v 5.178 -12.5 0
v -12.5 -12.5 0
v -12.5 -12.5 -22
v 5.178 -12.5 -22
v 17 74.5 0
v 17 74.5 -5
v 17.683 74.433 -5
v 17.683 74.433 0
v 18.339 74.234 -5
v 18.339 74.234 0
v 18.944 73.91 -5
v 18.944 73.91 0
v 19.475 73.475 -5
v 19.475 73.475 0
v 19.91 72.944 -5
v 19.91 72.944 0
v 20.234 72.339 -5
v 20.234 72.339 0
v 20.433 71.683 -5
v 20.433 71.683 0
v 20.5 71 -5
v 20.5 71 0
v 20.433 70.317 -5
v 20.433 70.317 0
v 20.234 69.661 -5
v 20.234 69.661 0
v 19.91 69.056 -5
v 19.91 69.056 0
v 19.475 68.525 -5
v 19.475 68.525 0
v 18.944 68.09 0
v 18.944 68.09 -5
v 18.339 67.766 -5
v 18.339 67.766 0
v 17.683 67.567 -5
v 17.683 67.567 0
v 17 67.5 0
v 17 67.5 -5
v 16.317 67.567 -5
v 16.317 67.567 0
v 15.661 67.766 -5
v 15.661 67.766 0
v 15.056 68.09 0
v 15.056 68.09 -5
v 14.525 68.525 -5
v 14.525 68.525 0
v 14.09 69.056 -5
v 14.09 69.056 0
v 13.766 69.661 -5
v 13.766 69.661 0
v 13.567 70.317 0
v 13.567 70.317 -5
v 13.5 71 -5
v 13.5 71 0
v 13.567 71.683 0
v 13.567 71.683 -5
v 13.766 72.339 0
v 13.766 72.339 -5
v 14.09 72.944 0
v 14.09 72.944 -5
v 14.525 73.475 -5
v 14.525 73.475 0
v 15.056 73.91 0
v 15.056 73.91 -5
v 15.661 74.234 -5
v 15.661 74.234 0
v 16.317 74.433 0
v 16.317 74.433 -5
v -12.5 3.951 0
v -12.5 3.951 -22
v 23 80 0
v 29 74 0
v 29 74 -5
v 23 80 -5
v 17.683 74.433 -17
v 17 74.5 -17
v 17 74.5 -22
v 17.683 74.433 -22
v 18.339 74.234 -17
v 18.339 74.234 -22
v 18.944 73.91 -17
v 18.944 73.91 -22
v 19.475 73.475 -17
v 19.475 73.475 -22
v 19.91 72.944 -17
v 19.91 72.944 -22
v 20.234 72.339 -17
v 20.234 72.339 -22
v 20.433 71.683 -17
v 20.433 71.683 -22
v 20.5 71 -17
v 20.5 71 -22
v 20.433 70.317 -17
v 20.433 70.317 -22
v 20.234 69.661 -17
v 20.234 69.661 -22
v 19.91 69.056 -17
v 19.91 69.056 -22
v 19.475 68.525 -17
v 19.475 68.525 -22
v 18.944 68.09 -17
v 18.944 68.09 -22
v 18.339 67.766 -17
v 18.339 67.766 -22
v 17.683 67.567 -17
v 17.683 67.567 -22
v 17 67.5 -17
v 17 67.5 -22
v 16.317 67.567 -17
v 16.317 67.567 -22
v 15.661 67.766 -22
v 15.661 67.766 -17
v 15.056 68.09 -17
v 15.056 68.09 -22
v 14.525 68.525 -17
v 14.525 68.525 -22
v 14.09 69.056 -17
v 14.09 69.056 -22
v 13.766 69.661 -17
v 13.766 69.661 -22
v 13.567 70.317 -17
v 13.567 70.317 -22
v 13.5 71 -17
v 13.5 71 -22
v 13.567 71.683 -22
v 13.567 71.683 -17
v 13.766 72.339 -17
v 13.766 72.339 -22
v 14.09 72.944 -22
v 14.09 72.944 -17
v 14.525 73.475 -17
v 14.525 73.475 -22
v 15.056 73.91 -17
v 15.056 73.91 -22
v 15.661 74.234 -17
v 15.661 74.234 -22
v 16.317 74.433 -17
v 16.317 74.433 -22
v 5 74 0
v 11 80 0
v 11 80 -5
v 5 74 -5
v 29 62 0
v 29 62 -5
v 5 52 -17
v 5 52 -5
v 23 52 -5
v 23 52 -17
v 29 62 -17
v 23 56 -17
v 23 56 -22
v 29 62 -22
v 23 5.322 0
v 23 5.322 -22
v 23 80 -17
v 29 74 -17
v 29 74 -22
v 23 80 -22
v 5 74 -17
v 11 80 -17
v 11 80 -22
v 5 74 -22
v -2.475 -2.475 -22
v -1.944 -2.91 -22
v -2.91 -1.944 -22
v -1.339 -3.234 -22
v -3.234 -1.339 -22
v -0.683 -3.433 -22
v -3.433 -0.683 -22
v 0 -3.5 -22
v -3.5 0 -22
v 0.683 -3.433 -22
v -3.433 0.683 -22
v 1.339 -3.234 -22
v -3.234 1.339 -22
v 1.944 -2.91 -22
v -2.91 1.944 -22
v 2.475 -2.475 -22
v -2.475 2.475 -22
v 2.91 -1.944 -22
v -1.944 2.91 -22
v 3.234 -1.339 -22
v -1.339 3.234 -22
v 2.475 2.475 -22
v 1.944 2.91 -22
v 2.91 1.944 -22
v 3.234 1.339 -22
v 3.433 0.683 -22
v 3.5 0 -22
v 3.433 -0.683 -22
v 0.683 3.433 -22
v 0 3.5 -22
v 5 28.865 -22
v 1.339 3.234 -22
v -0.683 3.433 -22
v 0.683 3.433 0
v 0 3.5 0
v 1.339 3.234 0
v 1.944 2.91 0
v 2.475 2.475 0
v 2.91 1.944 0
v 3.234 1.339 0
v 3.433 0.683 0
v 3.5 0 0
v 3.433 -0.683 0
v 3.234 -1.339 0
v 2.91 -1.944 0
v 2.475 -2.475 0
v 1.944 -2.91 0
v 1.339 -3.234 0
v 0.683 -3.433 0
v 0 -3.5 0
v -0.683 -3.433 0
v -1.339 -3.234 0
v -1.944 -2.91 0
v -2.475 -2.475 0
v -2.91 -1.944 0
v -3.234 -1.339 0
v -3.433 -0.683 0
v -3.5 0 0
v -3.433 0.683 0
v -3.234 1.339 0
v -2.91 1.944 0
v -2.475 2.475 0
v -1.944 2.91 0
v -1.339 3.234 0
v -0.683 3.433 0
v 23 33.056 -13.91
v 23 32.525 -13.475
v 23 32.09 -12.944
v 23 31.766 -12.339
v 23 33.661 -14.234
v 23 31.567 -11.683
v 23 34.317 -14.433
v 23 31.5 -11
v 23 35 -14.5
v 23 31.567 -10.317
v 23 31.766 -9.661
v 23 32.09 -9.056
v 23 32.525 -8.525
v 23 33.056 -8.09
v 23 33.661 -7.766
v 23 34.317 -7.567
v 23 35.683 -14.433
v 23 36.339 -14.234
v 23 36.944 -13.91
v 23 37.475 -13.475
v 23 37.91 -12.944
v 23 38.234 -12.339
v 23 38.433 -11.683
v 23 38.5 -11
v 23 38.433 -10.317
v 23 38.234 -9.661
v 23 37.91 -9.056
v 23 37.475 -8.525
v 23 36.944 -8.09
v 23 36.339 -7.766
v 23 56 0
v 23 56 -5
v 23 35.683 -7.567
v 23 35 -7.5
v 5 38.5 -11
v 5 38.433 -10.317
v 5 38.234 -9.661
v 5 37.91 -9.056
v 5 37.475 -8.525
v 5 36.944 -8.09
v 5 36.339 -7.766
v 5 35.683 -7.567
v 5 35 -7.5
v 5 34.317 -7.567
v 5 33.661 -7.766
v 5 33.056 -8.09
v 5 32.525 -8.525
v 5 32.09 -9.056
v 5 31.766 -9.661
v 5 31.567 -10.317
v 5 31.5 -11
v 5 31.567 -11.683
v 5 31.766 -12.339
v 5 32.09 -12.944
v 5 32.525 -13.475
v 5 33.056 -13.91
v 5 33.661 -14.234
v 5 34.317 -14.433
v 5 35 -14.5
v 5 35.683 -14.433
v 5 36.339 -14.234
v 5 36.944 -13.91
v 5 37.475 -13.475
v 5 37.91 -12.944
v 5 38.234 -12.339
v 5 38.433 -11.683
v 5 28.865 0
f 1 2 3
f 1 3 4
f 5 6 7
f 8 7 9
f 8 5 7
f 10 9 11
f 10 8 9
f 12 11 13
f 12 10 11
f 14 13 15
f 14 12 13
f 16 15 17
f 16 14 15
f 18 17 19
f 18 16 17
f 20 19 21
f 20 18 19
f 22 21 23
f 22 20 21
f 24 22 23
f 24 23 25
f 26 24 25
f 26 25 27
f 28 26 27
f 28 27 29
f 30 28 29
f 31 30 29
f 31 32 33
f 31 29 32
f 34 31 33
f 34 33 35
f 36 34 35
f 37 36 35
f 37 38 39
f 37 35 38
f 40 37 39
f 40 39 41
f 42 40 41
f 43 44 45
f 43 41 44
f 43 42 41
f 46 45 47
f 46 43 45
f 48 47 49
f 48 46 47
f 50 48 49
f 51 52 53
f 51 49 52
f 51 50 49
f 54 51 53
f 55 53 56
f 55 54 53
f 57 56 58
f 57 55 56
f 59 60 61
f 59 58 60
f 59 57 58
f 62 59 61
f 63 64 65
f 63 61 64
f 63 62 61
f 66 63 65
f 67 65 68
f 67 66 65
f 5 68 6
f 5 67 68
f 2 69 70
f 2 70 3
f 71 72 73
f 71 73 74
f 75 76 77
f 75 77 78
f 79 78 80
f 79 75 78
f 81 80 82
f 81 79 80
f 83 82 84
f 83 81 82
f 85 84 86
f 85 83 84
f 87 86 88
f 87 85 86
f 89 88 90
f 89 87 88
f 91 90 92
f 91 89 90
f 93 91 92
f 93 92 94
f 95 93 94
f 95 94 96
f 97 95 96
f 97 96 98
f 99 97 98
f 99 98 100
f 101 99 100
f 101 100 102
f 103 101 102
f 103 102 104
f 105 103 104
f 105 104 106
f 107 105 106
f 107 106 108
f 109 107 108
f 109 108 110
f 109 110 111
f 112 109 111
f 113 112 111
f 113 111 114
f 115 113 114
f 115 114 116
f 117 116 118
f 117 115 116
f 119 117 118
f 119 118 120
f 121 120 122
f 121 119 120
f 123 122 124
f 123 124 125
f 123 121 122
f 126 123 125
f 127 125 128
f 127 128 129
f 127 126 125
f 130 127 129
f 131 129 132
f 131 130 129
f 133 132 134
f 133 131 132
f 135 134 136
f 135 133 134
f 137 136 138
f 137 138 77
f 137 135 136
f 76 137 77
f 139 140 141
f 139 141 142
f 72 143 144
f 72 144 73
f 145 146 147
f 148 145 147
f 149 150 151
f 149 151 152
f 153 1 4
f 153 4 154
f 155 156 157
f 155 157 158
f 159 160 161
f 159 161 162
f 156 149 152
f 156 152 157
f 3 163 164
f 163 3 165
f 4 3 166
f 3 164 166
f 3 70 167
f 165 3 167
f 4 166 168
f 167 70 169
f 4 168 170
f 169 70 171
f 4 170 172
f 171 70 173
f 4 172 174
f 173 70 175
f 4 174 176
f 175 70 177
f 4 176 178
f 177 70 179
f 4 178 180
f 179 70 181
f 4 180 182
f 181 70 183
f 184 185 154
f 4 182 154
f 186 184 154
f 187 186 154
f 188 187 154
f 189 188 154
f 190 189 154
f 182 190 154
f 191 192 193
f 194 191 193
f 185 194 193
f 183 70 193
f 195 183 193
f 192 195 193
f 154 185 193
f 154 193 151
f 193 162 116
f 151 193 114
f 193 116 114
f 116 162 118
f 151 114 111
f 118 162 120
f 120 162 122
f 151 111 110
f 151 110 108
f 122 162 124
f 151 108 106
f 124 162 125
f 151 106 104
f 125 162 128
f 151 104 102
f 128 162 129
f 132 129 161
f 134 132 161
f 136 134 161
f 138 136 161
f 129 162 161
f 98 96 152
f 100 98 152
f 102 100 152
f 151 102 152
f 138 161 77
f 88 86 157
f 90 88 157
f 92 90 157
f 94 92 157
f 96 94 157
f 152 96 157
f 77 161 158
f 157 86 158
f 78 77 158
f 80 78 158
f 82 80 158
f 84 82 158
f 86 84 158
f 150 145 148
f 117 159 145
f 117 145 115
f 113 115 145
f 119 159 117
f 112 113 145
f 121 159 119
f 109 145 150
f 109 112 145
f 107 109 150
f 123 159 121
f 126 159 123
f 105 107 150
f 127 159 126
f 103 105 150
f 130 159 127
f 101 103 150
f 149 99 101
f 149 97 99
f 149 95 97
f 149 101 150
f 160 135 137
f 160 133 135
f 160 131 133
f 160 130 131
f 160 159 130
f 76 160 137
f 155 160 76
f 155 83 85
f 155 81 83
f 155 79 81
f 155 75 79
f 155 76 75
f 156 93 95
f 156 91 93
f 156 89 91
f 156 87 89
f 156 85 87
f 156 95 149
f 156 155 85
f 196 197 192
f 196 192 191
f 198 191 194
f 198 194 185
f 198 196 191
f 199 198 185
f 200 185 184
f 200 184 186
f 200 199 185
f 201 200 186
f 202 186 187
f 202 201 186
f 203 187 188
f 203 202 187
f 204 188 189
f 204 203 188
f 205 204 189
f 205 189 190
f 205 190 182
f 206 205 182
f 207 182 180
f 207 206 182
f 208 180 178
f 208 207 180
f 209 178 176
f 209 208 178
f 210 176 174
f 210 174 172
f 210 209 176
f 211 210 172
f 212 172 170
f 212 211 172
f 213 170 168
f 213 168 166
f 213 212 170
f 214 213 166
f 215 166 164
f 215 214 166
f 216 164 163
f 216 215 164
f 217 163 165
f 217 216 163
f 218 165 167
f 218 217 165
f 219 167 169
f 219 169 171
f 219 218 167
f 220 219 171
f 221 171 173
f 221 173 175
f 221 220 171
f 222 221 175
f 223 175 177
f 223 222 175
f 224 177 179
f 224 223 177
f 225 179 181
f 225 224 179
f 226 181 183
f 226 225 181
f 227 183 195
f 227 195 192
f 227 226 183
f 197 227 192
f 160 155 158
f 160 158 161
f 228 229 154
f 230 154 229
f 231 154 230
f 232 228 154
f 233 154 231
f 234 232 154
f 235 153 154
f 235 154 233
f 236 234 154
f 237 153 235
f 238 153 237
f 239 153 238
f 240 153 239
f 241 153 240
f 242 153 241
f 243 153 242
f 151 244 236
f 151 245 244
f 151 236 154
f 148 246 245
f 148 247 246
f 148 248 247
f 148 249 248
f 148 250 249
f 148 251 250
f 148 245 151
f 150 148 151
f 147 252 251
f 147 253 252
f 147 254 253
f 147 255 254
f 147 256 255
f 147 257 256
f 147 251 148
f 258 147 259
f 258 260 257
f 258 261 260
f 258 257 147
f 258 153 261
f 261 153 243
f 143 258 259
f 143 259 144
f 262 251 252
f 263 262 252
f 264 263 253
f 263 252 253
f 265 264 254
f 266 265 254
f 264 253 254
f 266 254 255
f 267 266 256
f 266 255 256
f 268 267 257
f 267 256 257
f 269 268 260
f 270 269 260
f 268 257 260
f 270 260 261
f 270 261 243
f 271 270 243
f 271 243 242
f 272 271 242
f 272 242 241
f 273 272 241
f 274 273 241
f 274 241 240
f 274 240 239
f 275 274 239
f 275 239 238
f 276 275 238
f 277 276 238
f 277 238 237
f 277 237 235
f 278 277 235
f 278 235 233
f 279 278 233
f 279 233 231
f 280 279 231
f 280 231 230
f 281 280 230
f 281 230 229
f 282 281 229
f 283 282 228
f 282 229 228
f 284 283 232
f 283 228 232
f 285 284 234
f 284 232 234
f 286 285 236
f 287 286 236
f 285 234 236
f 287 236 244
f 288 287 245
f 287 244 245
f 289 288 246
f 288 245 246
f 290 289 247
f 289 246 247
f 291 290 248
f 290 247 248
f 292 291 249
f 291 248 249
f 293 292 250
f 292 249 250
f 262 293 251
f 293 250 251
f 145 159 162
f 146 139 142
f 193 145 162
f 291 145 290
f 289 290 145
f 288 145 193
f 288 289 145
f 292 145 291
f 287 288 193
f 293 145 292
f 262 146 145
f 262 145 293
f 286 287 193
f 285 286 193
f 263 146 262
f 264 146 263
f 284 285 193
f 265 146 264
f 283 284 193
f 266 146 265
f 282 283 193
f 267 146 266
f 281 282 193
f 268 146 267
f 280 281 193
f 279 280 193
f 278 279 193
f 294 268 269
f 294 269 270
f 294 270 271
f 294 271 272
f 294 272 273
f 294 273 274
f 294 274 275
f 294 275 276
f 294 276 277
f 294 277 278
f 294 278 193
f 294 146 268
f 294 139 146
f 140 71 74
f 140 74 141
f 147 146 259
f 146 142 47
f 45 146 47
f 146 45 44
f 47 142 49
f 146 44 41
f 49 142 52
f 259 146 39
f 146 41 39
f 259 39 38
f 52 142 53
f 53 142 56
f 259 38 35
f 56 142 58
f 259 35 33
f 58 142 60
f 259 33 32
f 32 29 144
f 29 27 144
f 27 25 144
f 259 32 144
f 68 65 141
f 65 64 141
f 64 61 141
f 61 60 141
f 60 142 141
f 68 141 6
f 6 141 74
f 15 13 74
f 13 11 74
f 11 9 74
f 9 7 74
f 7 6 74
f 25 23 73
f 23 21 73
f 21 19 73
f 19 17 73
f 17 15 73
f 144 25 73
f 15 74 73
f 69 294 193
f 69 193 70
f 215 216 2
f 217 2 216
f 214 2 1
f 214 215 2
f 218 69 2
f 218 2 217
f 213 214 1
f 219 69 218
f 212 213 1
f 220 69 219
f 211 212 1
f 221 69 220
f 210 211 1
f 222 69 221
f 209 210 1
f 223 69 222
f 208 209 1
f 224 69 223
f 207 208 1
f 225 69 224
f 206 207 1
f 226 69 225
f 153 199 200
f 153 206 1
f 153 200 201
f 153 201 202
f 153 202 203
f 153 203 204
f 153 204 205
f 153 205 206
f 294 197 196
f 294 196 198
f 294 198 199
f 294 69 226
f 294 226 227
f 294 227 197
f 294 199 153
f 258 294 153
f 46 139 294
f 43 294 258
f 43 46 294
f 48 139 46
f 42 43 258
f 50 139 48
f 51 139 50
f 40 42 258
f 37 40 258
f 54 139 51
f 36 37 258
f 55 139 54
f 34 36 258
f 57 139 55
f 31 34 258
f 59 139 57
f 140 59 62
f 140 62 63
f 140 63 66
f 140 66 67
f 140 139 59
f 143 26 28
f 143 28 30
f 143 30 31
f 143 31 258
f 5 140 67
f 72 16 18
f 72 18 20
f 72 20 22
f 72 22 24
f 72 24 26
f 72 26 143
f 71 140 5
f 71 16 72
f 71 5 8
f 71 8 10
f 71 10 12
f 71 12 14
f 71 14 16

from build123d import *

# Parameters (mm, degrees)
ESQUISSE1_R             = 3.5
BASE_EXTRUSION_DEPTH    = 22
ESQUISSE2_W             = 37.834703774
ESQUISSE2_H             = 34.90934008
ENL_V_MAT_EXTRU_1_DEPTH = 6
ESQUISSE3_R             = 3.5
ENL_V_MAT_EXTRU_2_DEPTH = 91.245498503


with BuildPart() as part:
    # Esquisse1 → Base-Extrusion (new body)
    with BuildSketch(Plane(origin=(0, 0, 0), x_dir=(-1, 0, 0), z_dir=(0, 0, -1))):
        Polygon((12.5, -12.5), (-5.17766953, -12.5), (-23, 5.32233047), (-23, 56), (-29, 62), (-29, 74), (-23, 80), (-11, 80), (-5, 74), (-5, 28.864908166), (12.5, 3.951485697), align=None)
        with Locations(Location((0, 0, 0), (0, 0, 90))):
            Circle(ESQUISSE1_R, mode=Mode.SUBTRACT)
        with Locations(Location((-17, 71, 0), (0, 0, 90))):
            Circle(ESQUISSE1_R, mode=Mode.SUBTRACT)
    extrude(amount=BASE_EXTRUSION_DEPTH)

    # Esquisse2 → Enlèv. mat.-Extru.1 (cut, symmetric)
    with BuildSketch(Plane.XY.offset(-11)):
        with Locations((15.075848619, 69.45467004)):
            Rectangle(ESQUISSE2_W, ESQUISSE2_H)
    extrude(amount=ENL_V_MAT_EXTRU_1_DEPTH, both=True, mode=Mode.SUBTRACT)

    # Esquisse3 → Enlèv. mat.-Extru.2 (cut, through all)
    with BuildSketch(Plane(origin=(23, 0, 0), x_dir=(0, 0, -1), z_dir=(1, 0, 0))):
        with Locations(Location((11, 35, 0), (0, 0, 90))):
            Circle(ESQUISSE3_R)
    extrude(amount=-ENL_V_MAT_EXTRU_2_DEPTH, mode=Mode.SUBTRACT)


solid = part.part
